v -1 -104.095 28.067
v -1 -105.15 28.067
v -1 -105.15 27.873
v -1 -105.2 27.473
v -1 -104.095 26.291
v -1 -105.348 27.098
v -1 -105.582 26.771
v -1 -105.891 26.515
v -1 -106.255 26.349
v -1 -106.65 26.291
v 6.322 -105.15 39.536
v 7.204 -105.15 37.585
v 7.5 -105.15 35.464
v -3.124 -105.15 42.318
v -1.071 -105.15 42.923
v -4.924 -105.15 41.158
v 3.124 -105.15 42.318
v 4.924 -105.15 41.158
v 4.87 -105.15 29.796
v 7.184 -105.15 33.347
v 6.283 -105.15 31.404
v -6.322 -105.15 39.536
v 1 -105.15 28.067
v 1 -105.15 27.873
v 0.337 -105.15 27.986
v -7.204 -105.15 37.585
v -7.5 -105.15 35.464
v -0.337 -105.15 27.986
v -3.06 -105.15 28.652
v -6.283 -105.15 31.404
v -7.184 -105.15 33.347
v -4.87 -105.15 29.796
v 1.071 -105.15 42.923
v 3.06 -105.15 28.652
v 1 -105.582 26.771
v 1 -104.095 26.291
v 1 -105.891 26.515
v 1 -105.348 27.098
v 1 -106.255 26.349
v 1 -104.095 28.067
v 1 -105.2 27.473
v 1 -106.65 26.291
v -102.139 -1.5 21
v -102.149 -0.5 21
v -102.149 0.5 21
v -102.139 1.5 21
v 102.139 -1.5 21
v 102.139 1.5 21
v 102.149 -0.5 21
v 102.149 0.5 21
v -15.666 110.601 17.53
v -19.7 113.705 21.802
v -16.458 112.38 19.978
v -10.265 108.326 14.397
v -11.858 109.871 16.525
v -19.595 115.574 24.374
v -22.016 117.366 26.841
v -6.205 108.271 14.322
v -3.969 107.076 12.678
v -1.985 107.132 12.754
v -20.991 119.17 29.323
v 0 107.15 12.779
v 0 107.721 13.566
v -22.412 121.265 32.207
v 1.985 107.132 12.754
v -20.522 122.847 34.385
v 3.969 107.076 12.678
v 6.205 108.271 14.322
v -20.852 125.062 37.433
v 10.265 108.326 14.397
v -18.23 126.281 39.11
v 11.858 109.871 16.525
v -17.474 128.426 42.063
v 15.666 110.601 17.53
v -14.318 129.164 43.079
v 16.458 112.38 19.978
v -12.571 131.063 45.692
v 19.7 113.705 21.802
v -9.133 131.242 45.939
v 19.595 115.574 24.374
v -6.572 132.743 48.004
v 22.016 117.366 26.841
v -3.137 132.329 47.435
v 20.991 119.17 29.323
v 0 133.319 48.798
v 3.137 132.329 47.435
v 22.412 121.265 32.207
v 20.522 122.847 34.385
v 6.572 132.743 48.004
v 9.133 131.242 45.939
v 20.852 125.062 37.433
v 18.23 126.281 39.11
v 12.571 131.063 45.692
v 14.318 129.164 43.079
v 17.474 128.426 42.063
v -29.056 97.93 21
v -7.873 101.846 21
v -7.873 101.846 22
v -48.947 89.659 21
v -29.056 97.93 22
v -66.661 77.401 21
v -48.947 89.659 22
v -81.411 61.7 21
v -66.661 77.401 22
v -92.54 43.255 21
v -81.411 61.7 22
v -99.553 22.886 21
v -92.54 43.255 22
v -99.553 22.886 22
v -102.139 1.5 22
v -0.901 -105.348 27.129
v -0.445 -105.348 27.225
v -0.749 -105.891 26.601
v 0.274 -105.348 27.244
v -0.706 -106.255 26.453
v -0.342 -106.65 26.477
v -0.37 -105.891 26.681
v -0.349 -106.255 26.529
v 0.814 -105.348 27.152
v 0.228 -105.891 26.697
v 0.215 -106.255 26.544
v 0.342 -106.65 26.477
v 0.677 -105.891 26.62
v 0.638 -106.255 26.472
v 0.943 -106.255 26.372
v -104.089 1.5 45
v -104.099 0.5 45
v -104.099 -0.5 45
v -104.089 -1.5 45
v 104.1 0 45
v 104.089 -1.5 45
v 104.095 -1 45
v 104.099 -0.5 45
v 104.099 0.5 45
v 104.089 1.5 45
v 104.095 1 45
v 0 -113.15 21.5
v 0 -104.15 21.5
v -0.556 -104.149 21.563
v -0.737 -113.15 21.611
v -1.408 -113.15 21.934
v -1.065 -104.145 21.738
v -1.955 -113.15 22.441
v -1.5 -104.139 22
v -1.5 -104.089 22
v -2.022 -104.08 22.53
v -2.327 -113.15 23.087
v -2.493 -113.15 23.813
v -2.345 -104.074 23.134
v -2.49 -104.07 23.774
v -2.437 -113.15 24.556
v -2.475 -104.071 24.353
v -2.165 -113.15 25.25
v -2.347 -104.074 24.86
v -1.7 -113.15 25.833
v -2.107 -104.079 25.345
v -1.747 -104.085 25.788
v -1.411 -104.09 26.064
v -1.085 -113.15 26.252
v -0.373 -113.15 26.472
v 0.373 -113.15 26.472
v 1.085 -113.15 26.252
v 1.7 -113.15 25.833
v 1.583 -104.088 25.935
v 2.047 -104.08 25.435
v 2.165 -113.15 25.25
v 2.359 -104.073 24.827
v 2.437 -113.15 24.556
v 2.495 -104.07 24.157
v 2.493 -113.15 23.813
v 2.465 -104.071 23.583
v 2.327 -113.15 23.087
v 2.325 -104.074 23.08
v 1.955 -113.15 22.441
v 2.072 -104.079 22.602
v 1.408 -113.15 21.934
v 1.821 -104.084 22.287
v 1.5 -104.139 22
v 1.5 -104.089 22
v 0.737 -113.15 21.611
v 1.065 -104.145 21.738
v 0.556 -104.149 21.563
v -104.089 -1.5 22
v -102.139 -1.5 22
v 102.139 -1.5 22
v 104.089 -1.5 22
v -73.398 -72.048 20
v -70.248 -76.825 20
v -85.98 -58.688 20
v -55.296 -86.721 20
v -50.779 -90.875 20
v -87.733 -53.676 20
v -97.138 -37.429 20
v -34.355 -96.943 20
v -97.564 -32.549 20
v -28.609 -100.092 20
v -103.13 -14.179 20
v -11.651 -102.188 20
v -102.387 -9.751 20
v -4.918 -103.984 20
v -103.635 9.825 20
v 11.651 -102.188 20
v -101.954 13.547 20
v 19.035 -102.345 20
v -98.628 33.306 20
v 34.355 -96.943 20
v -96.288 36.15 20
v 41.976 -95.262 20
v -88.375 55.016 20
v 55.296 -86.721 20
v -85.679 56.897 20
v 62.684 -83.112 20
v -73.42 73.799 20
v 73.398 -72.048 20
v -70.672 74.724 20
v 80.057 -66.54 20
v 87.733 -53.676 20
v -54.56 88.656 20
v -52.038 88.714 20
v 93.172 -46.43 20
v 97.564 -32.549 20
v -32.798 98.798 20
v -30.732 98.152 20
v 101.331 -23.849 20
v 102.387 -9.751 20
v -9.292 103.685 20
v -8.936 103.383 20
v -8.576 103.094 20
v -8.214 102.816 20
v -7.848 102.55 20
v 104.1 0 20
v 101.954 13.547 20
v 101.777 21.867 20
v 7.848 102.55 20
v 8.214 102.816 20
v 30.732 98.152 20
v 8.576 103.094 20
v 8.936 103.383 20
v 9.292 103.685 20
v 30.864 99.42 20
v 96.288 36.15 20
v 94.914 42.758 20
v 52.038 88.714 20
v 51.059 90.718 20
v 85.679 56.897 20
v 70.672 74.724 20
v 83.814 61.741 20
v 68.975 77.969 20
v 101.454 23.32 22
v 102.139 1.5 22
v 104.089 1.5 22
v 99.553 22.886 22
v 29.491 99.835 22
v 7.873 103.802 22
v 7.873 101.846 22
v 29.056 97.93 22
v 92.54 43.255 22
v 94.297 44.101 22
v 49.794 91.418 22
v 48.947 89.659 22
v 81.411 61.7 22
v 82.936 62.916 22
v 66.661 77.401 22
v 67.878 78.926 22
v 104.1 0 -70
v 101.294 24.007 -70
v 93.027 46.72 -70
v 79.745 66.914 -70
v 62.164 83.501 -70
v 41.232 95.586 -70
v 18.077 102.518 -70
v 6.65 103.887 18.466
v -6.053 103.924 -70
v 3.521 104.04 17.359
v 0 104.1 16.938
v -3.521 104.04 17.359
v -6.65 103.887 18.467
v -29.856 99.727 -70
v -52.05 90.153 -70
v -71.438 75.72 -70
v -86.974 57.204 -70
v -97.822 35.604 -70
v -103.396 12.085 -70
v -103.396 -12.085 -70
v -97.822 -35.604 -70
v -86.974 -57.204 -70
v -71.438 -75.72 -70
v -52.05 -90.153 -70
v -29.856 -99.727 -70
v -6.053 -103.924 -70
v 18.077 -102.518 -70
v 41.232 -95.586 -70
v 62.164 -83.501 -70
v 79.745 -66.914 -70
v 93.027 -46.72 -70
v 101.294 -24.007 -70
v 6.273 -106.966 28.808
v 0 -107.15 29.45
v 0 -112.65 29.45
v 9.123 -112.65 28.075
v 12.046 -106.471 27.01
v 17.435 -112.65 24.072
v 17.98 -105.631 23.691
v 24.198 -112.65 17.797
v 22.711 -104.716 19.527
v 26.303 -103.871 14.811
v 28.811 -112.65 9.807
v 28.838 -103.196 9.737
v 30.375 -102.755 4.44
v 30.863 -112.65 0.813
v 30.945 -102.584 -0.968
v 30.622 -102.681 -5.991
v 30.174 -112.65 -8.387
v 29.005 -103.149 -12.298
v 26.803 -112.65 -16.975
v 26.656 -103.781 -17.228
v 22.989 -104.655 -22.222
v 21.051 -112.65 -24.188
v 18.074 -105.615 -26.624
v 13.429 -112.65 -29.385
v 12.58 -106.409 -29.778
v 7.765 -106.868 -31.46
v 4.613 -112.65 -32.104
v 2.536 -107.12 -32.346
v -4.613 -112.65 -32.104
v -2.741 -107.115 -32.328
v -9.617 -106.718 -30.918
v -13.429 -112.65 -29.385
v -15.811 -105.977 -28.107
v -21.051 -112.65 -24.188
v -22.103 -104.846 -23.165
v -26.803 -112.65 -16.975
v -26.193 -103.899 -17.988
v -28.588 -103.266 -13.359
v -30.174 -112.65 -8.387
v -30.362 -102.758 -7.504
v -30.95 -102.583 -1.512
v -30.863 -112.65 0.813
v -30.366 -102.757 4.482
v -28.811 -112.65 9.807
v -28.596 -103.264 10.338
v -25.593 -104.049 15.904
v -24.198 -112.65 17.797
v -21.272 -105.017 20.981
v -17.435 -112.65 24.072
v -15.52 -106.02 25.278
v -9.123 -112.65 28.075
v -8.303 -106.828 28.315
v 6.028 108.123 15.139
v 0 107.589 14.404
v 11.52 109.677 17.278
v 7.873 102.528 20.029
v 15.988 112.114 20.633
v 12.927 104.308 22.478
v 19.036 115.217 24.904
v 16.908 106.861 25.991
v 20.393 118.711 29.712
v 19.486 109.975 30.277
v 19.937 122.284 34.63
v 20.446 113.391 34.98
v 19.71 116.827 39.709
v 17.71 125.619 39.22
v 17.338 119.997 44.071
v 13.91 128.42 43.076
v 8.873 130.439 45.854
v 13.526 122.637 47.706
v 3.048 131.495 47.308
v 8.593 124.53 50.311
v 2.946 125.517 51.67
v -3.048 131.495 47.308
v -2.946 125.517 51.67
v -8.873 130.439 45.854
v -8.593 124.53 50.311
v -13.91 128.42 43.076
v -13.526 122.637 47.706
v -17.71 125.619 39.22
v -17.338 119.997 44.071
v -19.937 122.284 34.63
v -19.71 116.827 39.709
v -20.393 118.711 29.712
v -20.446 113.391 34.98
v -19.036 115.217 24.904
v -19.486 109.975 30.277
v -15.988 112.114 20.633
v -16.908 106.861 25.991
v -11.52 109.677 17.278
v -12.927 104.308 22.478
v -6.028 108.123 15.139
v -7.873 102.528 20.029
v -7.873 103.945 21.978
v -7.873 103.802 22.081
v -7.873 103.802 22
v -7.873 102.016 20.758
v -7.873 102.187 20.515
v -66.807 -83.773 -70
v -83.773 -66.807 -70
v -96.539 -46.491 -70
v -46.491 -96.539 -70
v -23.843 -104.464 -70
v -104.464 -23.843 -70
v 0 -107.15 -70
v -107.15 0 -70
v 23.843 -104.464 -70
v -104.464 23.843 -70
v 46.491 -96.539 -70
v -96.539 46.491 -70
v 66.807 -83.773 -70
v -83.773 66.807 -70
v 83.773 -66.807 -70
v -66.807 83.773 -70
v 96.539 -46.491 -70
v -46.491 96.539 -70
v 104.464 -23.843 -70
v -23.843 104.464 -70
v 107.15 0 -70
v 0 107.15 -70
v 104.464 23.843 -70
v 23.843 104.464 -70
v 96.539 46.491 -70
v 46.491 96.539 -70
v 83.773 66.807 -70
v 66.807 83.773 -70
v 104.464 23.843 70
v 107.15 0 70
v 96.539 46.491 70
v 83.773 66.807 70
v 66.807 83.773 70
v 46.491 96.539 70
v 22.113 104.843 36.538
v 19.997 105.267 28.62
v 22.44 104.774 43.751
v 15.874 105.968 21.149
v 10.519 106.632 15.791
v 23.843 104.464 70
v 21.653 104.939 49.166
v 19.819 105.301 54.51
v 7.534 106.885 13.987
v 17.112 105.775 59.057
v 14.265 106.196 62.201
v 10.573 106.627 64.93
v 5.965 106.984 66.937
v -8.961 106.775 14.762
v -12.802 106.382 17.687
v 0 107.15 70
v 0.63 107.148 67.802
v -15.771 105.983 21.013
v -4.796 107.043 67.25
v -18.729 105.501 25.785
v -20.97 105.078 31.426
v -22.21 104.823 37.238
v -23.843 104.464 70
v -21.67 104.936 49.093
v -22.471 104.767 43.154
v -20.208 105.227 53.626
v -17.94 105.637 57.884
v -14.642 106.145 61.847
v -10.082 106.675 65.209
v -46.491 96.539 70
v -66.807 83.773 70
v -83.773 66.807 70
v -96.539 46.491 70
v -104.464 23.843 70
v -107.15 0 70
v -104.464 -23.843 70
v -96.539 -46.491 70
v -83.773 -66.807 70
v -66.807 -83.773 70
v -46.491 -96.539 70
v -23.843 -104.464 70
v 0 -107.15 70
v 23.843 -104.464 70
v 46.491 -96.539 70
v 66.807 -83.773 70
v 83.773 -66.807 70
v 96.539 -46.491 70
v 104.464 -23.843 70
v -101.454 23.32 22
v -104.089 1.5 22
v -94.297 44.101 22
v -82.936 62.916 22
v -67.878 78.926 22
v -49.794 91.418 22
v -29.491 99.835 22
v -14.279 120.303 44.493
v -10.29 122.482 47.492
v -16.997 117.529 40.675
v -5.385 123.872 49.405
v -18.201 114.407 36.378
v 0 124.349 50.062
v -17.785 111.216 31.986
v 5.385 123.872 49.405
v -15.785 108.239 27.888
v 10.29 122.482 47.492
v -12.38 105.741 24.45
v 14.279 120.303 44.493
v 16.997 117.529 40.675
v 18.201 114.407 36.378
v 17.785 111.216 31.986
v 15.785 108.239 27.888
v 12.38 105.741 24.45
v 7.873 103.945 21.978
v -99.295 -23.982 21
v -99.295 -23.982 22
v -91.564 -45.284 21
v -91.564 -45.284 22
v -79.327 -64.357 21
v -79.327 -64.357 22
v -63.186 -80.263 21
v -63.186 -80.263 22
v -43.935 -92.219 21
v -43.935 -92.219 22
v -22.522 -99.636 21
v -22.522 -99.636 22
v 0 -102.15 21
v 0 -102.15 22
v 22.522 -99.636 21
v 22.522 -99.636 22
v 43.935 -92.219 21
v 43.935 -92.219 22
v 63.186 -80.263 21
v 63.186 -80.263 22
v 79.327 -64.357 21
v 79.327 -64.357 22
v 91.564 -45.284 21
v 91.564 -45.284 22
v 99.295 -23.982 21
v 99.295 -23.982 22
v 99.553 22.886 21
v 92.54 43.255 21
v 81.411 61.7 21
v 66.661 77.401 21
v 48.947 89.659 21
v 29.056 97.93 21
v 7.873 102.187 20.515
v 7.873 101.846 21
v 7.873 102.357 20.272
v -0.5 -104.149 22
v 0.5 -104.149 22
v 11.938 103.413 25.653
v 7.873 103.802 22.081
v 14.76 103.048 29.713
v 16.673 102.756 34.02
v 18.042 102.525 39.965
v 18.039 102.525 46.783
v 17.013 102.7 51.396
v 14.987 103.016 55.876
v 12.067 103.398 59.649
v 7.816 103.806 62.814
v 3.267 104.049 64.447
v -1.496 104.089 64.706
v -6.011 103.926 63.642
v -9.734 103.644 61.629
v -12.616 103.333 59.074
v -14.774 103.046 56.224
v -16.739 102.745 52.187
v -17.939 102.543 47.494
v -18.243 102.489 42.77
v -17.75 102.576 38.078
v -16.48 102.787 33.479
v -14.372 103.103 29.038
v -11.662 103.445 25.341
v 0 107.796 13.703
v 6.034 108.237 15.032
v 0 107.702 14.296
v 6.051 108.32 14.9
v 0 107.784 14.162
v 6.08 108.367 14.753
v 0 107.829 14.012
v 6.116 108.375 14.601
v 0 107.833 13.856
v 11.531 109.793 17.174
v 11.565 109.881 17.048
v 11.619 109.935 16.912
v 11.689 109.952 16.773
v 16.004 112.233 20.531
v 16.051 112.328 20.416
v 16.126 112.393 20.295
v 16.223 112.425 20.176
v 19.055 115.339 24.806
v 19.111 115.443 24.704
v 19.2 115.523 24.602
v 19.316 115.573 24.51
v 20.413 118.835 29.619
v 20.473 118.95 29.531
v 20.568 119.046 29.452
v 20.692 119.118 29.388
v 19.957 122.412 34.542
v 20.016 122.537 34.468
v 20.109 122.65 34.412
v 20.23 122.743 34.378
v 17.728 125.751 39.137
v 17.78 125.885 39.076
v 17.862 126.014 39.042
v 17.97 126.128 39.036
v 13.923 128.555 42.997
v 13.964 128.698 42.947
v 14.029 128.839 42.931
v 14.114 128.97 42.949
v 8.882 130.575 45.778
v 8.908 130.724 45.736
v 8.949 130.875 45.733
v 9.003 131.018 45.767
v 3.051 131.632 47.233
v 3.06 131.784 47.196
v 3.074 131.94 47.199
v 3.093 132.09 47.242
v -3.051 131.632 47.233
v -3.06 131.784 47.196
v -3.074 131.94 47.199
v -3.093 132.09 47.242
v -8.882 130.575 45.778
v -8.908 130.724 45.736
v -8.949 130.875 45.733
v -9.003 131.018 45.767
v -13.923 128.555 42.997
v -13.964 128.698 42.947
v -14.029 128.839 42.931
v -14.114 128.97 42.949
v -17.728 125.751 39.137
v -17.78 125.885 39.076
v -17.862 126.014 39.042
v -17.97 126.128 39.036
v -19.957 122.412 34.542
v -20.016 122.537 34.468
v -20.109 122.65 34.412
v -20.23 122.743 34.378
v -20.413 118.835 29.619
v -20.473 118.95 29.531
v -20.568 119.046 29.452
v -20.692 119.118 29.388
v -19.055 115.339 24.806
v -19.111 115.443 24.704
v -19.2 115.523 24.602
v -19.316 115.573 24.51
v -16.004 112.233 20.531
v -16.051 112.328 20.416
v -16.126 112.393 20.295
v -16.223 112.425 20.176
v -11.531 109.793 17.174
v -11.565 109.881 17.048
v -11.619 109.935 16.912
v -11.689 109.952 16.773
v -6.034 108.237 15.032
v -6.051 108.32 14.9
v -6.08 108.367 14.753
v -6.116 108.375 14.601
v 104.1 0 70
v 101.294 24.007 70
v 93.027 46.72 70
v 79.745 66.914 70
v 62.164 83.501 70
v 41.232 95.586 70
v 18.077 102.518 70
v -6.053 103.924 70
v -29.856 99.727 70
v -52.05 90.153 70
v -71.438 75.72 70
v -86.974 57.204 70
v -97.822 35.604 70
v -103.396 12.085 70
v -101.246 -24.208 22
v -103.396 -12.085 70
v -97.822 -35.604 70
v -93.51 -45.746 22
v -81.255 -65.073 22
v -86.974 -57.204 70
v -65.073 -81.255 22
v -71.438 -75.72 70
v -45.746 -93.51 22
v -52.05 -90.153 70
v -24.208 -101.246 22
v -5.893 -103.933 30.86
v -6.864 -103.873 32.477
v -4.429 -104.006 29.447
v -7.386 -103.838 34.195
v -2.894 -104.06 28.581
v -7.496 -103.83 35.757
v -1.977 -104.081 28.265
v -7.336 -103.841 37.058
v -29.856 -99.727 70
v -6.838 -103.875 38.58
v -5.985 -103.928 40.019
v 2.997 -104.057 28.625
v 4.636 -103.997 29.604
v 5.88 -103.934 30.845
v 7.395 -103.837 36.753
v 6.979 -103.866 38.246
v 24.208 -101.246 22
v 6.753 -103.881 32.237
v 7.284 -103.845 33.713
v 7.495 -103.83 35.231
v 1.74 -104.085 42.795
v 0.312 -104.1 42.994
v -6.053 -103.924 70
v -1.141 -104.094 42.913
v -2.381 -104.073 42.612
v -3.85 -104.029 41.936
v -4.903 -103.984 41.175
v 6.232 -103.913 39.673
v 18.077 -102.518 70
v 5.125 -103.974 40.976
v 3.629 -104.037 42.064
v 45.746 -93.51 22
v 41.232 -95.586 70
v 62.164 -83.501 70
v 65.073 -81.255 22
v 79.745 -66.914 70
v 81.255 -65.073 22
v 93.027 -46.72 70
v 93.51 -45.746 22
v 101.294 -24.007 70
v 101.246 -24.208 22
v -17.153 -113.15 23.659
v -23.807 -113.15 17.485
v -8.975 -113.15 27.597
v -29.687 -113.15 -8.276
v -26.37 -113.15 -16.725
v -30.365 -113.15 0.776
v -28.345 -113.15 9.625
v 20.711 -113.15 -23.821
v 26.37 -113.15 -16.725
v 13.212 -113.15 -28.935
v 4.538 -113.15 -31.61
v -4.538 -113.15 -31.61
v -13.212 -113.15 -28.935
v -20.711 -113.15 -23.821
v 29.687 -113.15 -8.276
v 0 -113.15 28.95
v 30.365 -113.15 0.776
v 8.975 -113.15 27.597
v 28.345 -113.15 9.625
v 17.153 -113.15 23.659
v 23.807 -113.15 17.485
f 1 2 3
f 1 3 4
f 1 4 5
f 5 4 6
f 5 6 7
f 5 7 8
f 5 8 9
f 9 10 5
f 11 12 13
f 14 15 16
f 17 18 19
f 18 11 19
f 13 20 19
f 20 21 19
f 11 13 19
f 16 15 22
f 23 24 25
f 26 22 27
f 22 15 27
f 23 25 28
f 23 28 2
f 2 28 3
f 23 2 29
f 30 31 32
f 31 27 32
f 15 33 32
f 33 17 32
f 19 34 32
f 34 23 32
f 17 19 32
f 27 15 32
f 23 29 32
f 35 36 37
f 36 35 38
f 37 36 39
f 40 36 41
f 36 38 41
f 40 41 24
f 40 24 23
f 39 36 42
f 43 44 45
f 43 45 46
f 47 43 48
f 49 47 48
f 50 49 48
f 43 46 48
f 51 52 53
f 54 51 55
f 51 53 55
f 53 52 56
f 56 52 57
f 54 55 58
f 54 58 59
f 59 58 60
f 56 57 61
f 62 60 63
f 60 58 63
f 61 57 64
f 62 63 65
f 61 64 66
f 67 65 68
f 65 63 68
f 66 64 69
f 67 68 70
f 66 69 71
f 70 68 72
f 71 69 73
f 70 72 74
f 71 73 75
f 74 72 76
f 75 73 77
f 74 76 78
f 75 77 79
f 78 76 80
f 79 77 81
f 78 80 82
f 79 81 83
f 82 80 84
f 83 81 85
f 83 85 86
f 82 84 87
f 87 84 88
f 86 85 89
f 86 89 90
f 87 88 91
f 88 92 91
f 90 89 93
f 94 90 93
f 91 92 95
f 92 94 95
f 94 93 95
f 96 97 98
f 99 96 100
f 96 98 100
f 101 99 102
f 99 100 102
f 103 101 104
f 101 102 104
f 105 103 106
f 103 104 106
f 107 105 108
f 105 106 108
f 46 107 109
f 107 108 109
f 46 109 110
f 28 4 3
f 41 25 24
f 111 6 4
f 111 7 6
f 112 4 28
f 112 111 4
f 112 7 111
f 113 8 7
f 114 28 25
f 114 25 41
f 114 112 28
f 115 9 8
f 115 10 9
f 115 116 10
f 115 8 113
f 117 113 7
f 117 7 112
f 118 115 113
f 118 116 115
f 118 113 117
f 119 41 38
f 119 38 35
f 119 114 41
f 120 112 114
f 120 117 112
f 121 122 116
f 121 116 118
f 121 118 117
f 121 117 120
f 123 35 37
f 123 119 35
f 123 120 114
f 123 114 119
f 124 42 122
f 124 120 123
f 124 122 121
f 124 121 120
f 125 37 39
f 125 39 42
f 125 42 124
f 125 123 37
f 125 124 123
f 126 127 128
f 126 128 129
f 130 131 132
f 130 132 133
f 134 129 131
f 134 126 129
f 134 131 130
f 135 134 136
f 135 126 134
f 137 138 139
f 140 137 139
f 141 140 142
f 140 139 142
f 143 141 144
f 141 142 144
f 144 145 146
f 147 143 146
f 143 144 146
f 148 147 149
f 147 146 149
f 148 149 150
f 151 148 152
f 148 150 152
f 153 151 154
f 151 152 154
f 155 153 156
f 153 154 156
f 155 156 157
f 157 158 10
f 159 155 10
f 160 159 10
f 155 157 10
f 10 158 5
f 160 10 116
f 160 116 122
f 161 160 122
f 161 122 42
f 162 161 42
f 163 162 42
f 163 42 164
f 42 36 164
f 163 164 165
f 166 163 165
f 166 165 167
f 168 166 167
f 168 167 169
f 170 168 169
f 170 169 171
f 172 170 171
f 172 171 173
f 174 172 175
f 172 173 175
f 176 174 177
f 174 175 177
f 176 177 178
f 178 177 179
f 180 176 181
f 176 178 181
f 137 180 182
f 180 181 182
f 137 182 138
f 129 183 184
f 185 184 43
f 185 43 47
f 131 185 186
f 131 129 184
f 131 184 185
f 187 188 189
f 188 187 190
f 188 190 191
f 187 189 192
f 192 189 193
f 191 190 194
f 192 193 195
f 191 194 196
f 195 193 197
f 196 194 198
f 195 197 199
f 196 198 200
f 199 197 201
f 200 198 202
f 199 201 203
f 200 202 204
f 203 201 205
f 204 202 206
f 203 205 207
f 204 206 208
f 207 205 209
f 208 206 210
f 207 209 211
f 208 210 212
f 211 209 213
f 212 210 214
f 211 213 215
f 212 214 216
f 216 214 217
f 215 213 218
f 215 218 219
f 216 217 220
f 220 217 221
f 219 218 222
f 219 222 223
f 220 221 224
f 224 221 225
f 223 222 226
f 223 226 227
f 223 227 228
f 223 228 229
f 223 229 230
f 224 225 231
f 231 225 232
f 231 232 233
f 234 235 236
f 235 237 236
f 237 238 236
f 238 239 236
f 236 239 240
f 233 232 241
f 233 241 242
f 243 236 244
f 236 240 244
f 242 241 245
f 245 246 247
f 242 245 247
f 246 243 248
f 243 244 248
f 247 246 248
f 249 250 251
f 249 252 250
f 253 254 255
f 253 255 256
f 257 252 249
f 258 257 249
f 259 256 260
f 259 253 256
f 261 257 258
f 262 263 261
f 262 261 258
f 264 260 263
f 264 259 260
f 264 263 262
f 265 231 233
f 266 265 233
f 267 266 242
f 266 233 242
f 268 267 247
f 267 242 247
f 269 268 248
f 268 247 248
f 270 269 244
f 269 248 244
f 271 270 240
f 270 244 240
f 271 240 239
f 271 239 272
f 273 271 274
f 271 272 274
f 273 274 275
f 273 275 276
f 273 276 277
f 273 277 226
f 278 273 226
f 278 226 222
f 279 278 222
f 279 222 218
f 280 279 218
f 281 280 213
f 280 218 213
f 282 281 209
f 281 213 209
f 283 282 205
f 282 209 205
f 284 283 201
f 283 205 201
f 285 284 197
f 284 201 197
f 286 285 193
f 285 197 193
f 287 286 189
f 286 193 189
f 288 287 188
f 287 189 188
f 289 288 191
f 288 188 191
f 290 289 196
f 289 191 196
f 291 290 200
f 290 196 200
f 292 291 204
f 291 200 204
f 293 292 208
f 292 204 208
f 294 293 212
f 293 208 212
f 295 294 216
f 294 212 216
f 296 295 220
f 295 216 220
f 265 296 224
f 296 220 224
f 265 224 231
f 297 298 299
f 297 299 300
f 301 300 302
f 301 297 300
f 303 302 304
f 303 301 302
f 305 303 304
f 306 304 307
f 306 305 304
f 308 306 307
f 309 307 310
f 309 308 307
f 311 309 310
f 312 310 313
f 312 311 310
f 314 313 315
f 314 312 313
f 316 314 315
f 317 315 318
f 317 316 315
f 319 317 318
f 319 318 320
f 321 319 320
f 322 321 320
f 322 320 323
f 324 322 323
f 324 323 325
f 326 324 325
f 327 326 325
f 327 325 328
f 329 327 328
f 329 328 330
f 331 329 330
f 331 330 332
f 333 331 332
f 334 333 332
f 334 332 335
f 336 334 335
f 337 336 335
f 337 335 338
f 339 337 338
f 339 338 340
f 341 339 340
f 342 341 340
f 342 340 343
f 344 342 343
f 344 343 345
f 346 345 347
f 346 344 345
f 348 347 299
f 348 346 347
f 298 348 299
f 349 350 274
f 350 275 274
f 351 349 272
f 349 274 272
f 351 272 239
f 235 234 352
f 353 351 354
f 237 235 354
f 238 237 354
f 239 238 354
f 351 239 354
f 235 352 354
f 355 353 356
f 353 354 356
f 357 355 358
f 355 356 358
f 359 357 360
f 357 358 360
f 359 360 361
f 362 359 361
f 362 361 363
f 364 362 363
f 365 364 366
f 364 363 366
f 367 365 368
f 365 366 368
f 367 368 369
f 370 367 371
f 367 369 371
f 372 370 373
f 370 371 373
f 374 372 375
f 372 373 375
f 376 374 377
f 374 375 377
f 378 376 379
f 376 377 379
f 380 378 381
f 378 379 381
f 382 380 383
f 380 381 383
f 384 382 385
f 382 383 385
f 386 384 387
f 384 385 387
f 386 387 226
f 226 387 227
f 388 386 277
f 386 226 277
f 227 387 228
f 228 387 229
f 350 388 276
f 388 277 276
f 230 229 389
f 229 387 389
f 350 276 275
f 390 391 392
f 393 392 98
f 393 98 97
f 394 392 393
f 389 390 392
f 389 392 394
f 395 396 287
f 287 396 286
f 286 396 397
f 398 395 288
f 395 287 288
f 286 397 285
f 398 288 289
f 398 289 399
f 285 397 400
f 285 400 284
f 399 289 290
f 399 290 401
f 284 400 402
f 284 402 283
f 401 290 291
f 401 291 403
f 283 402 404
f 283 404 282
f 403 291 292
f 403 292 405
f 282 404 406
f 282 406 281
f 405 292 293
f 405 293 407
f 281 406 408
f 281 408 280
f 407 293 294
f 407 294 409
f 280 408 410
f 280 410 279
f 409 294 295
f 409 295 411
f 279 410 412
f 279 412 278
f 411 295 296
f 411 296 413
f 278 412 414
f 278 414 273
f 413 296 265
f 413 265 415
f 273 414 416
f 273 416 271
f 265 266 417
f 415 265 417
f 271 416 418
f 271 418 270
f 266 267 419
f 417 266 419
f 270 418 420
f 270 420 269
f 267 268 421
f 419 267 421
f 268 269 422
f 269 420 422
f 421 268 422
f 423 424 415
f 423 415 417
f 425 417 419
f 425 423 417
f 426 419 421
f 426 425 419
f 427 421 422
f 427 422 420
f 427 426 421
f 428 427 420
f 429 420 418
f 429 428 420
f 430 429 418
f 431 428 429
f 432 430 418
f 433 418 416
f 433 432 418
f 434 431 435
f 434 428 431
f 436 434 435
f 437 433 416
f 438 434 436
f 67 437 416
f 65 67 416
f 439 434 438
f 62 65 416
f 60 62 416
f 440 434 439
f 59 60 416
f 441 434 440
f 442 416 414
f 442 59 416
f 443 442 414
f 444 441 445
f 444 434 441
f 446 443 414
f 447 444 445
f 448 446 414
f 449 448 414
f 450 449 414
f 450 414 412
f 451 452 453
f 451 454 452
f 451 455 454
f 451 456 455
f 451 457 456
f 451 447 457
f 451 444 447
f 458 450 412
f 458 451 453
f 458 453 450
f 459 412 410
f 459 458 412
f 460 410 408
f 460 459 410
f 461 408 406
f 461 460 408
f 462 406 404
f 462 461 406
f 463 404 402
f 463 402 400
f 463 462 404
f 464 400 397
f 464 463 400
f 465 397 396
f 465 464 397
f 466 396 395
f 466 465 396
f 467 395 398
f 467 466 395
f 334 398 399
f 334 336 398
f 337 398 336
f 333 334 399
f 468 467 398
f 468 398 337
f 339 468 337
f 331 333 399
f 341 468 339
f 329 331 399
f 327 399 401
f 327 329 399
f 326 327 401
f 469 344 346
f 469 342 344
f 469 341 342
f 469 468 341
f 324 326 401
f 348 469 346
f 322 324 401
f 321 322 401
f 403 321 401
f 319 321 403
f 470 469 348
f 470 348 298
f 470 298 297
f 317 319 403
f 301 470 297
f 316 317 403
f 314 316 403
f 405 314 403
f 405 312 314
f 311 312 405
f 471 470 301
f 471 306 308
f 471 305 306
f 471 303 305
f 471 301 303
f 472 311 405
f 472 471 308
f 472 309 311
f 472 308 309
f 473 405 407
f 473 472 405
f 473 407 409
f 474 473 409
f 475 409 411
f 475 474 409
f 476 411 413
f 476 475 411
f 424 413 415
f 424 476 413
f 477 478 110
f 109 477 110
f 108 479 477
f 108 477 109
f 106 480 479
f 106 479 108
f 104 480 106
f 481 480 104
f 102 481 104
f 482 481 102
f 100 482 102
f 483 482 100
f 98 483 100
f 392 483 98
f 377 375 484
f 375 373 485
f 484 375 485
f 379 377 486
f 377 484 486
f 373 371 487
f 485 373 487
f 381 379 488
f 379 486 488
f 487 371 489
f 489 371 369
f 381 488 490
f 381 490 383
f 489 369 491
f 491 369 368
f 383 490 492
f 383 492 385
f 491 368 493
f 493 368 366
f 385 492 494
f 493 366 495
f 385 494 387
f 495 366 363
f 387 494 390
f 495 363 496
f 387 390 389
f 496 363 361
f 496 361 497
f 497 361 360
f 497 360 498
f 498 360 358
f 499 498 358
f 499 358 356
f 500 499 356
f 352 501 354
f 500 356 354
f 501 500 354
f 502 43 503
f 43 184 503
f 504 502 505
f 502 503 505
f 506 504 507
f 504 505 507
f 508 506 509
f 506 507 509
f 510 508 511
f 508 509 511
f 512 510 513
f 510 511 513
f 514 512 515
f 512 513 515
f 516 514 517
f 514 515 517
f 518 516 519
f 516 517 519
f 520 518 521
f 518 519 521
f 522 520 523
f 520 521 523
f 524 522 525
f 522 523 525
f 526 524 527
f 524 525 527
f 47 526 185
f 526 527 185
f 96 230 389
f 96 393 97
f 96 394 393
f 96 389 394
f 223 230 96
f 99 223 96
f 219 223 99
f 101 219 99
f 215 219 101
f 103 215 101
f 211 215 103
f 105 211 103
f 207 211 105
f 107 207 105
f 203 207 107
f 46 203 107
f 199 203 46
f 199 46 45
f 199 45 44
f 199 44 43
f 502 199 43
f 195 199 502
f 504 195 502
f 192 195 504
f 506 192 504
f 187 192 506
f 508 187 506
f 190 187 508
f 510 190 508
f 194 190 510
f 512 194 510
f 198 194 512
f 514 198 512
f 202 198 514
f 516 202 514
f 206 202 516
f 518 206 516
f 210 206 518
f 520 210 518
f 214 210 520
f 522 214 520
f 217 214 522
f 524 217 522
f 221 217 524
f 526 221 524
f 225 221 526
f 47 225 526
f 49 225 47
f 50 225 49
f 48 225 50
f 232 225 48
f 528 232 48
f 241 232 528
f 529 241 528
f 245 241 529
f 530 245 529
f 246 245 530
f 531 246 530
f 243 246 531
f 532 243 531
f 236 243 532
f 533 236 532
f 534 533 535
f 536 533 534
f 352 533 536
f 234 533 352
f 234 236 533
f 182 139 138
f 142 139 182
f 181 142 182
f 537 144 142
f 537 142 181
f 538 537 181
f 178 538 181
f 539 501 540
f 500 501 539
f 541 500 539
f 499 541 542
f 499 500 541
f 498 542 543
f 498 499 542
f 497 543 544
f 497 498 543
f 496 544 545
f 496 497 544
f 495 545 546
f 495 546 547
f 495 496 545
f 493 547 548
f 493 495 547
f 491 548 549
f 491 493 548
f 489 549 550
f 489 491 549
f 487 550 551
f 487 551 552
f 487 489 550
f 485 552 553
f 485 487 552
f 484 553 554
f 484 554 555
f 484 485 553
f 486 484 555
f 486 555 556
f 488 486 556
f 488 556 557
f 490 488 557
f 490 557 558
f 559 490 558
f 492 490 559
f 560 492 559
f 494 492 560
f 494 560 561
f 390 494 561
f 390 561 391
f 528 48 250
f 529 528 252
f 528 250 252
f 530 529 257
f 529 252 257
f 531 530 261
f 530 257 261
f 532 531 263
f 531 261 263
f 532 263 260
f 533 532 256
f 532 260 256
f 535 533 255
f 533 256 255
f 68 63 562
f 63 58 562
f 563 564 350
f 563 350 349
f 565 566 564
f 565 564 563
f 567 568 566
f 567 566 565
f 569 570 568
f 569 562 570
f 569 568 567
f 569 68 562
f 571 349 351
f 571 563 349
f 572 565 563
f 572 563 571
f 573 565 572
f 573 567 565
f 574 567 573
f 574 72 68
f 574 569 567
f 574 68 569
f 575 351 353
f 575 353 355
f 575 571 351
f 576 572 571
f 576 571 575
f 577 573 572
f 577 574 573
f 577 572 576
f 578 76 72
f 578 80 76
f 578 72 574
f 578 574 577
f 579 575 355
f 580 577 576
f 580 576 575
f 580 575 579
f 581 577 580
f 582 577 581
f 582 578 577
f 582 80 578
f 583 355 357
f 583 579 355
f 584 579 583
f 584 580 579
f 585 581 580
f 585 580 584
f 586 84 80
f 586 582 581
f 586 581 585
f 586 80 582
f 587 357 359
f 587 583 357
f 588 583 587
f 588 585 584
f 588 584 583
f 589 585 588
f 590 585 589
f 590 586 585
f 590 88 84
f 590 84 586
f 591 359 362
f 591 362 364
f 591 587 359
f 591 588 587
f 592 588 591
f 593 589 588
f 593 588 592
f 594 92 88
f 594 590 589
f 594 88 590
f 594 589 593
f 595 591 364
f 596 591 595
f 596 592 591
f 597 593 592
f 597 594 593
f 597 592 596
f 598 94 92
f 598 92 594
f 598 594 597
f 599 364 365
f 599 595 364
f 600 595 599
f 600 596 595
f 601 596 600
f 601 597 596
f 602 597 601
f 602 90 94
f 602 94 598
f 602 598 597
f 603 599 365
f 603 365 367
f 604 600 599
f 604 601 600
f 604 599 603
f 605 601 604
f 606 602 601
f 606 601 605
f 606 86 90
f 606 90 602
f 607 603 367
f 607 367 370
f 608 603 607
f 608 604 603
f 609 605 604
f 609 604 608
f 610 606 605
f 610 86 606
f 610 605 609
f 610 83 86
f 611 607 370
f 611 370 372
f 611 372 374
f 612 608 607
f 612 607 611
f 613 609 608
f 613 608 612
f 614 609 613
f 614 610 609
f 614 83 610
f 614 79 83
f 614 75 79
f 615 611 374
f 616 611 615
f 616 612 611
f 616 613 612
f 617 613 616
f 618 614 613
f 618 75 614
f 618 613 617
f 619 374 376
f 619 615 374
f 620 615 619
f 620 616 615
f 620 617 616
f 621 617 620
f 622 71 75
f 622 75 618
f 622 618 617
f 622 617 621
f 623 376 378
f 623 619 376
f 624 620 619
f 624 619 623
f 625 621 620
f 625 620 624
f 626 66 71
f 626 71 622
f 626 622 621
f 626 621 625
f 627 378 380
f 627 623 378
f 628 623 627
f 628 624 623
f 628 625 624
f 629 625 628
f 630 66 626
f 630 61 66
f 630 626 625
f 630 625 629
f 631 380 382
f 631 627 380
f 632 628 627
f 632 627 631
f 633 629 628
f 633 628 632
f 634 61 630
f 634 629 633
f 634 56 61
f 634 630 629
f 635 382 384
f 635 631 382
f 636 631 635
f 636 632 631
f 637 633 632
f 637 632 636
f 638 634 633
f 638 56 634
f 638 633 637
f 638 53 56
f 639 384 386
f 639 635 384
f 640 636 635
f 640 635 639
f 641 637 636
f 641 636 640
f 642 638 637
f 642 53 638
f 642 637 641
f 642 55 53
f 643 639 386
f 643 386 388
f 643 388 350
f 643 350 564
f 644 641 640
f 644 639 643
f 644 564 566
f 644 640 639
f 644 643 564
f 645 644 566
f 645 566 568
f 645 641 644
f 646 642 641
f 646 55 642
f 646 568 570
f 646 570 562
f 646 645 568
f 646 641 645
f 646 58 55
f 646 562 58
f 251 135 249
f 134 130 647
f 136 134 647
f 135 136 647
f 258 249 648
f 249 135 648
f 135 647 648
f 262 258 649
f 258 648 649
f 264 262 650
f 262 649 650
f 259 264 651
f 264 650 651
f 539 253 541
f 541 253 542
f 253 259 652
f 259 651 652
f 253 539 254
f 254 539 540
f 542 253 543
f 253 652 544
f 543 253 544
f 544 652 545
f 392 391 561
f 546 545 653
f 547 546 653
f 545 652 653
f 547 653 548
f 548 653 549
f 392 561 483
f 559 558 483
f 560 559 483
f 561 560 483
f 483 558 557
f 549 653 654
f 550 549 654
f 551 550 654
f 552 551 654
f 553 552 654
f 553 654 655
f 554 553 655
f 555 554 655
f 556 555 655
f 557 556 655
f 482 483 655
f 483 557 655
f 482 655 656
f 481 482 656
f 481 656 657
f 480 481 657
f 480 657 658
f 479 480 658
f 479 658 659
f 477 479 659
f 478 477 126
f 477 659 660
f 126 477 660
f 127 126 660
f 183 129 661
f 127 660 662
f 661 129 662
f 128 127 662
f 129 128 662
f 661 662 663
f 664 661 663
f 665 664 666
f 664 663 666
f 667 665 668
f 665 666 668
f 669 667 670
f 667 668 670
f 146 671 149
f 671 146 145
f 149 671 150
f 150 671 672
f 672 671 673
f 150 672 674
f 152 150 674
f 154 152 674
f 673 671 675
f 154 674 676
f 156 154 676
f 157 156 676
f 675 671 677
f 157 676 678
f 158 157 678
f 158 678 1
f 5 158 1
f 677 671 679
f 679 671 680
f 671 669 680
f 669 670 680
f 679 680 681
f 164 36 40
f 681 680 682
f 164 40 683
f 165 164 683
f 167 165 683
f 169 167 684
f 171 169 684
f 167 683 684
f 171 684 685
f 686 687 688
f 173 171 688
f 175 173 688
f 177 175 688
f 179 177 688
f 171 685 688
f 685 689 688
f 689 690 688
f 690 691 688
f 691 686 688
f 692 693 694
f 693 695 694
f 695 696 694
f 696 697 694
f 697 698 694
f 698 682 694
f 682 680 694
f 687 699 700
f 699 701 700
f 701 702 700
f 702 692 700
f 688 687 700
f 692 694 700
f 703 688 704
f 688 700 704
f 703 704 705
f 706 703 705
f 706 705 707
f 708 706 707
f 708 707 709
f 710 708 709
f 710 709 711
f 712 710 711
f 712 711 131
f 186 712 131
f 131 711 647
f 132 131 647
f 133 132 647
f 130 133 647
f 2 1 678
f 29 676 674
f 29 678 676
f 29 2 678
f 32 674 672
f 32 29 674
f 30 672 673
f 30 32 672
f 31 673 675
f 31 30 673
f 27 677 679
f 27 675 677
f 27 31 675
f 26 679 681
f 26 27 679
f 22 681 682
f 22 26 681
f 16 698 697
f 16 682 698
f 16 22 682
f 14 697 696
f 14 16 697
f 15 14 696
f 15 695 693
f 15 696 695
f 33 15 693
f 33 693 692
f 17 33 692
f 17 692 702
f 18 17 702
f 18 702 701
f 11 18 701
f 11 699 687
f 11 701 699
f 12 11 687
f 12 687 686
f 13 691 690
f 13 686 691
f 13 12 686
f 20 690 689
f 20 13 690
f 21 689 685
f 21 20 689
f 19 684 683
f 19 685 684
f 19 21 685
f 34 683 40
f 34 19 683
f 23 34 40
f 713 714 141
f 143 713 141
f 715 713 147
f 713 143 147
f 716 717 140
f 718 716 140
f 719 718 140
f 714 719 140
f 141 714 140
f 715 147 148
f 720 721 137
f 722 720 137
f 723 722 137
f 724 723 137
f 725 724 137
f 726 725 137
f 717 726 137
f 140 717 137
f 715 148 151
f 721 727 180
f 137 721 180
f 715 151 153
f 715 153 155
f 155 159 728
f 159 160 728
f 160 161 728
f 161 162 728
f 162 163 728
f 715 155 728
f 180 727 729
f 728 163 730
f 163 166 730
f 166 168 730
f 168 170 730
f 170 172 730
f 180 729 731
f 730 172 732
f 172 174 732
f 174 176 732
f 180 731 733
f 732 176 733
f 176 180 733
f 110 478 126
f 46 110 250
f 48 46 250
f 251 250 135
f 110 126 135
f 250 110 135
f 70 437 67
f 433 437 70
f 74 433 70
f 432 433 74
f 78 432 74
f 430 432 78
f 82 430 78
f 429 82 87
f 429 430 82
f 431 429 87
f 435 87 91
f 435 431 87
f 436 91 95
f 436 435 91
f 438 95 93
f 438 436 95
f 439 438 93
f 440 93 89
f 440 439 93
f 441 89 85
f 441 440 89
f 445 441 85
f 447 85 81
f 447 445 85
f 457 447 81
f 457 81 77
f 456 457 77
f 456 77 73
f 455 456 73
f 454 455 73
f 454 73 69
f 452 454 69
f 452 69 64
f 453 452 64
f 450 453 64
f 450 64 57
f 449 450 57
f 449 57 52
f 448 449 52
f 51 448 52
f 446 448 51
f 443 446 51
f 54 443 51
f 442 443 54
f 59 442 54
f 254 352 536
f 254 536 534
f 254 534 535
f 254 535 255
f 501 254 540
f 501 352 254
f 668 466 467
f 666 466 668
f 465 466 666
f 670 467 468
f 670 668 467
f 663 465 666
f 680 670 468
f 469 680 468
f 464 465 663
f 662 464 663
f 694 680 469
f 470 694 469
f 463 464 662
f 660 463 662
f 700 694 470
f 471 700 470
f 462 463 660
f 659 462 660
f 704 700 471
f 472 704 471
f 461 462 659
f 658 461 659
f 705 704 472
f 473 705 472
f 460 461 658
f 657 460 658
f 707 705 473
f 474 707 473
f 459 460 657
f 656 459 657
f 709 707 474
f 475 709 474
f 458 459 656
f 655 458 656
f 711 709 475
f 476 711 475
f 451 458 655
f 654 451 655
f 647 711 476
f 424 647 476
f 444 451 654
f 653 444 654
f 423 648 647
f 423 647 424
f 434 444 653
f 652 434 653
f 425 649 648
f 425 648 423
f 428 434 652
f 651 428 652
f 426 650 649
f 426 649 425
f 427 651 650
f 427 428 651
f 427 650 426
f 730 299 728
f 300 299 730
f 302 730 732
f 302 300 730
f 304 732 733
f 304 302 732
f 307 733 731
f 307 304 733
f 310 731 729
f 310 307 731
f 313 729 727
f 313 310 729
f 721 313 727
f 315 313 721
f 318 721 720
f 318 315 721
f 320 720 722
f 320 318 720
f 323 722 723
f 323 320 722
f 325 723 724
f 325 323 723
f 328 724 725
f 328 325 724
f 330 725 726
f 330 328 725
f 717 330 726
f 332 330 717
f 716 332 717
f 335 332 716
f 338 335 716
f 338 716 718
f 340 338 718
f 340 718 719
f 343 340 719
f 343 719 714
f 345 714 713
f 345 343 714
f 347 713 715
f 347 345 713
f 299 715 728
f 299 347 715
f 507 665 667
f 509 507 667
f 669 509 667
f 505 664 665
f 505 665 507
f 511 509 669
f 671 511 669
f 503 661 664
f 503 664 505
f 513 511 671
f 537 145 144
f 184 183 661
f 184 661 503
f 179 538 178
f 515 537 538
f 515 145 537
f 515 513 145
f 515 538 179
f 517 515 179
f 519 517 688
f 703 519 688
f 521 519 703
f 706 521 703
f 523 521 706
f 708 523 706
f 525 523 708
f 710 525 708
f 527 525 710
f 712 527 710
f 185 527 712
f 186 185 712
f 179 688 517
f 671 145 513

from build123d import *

# Parameters (mm, degrees)
BOSS_EXTRUDE2_DEPTH      = 70
BOSS_EXTRUDE2_DEPTH_BACK = 70
SKETCH2_R                = 107.15
SKETCH10_R               = 19
CUT_EXTRUDE2_DEPTH       = 10
BOSS_EXTRUDE6_DEPTH      = 32
BOSS_EXTRUDE6_DEPTH_BACK = 1
SKETCH18_R               = 22.5
BOSS_EXTRUDE7_DEPTH      = 5
BOSS_EXTRUDE7_DEPTH_BACK = 6
SKETCH56_R               = 30.95
SKETCH20_R               = 104.1
CUT_EXTRUDE3_DEPTH       = 140
CUT_EXTRUDE14_DEPTH      = 5
CUT_EXTRUDE14_DEPTH_BACK = 55
SKETCH51_R               = 2.5
CUT_EXTRUDE15_DEPTH      = 5
SKETCH44_R               = 7.5
CUT_EXTRUDE10_DEPTH      = 10
FILLET3_R                = 1.5
SKETCH61_R               = 104.15
BOSS_EXTRUDE8_DEPTH      = 2
SKETCH62_R               = 102.15
CUT_EXTRUDE16_DEPTH      = 10
CHAMFER7_SIZE            = 1
CHAMFER7_SIZE2           = 0.700207538
SKETCH5_W                = 211.3
SKETCH5_H                = 3
BOSS_EXTRUDE3_DEPTH      = 24
SKETCH24_R               = 18.25
CUT_EXTRUDE6_DEPTH       = 50
CUT_EXTRUDE5_DEPTH       = 7
CUT_EXTRUDE5_DEPTH_BACK  = 5
SKETCH23_R               = 20.45
CHAMFER1_SIZE            = 0.5
FILLET4_R                = 0.6
CUT_EXTRUDE19_DEPTH      = 4


with BuildPart() as part:
    # Sketch2 → Boss-Extrude2 (new, two sides: drawn at the far end of the back side and taken through both)
    with BuildSketch(Plane.XY.offset(-BOSS_EXTRUDE2_DEPTH_BACK)):
        Circle(SKETCH2_R)
    extrude(amount=BOSS_EXTRUDE2_DEPTH + BOSS_EXTRUDE2_DEPTH_BACK)

    # Sketch10 → Cut-Extrude2 (cut, symmetric)
    with BuildSketch(Plane(origin=(0, 51.109455148, -37.133192748), x_dir=(1, 0, 0), z_dir=(0, -0.8090169943749408, 0.5877852522924822))):
        with Locations((0, 95.341869558)):
            Circle(SKETCH10_R)
    extrude(amount=CUT_EXTRUDE2_DEPTH, both=True, mode=Mode.SUBTRACT)

    # Sketch18 → Boss-Extrude6 (add, two sides: drawn at the far end of the back side and taken through both)
    with BuildSketch(Plane(origin=(0, 63.244710063, -45.949971532), x_dir=(1, 0, 0), z_dir=(0, -0.8090169943749408, 0.5877852522924822)).offset(-BOSS_EXTRUDE6_DEPTH_BACK)):
        with Locations((0, 95.341869558)):
            Circle(SKETCH18_R)
    extrude(amount=BOSS_EXTRUDE6_DEPTH + BOSS_EXTRUDE6_DEPTH_BACK)

    # Sketch56 → Boss-Extrude7 (add, two sides: drawn at the far end of the back side and taken through both)
    with BuildSketch(Plane(origin=(0, -107.15, 0), x_dir=(1, 0, 0), z_dir=(0, 1, 0)).offset(-BOSS_EXTRUDE7_DEPTH_BACK)):
        with Locations((0, 1.5)):
            Circle(SKETCH56_R)
    extrude(amount=BOSS_EXTRUDE7_DEPTH + BOSS_EXTRUDE7_DEPTH_BACK)

    # Sketch20 → Cut-Extrude3 (cut)
    with BuildSketch(Plane.XY.offset(70)):
        Circle(SKETCH20_R)
    extrude(amount=-CUT_EXTRUDE3_DEPTH, mode=Mode.SUBTRACT)

    # Sketch51 → Cut-Extrude14 (cut, two sides: drawn at the far end of the back side and taken through both)
    with BuildSketch(Plane(origin=(0, -107.15, 0), x_dir=(1, 0, 0), z_dir=(0, 1, 0)).offset(-CUT_EXTRUDE14_DEPTH_BACK)):
        with Locations((0, -24)):
            Circle(SKETCH51_R)
    extrude(amount=CUT_EXTRUDE14_DEPTH + CUT_EXTRUDE14_DEPTH_BACK, mode=Mode.SUBTRACT)

    # Sketch58 → Cut-Extrude15 (cut)
    with BuildSketch(Plane(origin=(0, -105.15, 0), x_dir=(1, 0, 0), z_dir=(0, 1, 0))):
        Polygon((0, -24), (1, -24), (1, -34.192827208), (-1, -34.192827208), (-1, -24), align=None)
    extrude(amount=CUT_EXTRUDE15_DEPTH, mode=Mode.SUBTRACT)

    # Sketch44 → Cut-Extrude10 (cut)
    with BuildSketch(Plane(origin=(0, -105.15, 0), x_dir=(1, 0, 0), z_dir=(0, 1, 0))):
        with Locations((0, -35.5)):
            Circle(SKETCH44_R)
    extrude(amount=CUT_EXTRUDE10_DEPTH, mode=Mode.SUBTRACT)

    # Fillet3
    fillet3_edges = [part.edges().sort_by_distance(p)[0] for p in [
        (0, -105.15, 26.5),
    ]]
    fillet(fillet3_edges, radius=FILLET3_R)

    # Sketch61 → Boss-Extrude8 (add)
    with BuildSketch(Plane.XY.offset(22)):
        Circle(SKETCH61_R)
    extrude(amount=-BOSS_EXTRUDE8_DEPTH)

    # Sketch62 → Cut-Extrude16 (cut)
    with BuildSketch(Plane.XY.offset(22)):
        Circle(SKETCH62_R)
    extrude(amount=-CUT_EXTRUDE16_DEPTH, mode=Mode.SUBTRACT)

    # Chamfer7
    chamfer7_edges = [part.edges().sort_by_distance(p)[0] for p in [
        (-102.15, 0, 20),
    ]]
    chamfer7_side = [part.faces().sort_by_distance(p)[0] for p in [
        (-102.15, 0, 21),
    ]]
    chamfer(chamfer7_edges, length=CHAMFER7_SIZE, length2=CHAMFER7_SIZE2, reference=chamfer7_side[0])

    # Sketch5 → Boss-Extrude3 (add)
    with BuildSketch(Plane.XY.offset(45)):
        Rectangle(SKETCH5_W, SKETCH5_H)
    extrude(amount=-BOSS_EXTRUDE3_DEPTH)

    # Sketch24 → Cut-Extrude6 (cut)
    with BuildSketch(Plane(origin=(0, 63.244710063, -45.949971532), x_dir=(1, 0, 0), z_dir=(0, -0.8090169943749408, 0.5877852522924822))):
        with Locations((0, 95.341869558)):
            Circle(SKETCH24_R)
    extrude(amount=CUT_EXTRUDE6_DEPTH, mode=Mode.SUBTRACT)

    # Sketch23 → Cut-Extrude5 (cut, two sides: drawn at the far end of the back side and taken through both)
    with BuildSketch(Plane(origin=(0, 63.244710063, -45.949971532), x_dir=(1, 0, 0), z_dir=(0, -0.8090169943749408, 0.5877852522924822)).offset(-CUT_EXTRUDE5_DEPTH_BACK)):
        with Locations((0, 95.341869558)):
            Circle(SKETCH23_R)
    extrude(amount=CUT_EXTRUDE5_DEPTH + CUT_EXTRUDE5_DEPTH_BACK, mode=Mode.SUBTRACT)

    # Chamfer1
    chamfer1_edges = [part.edges().sort_by_distance(p)[0] for p in [
        (-30.95, -113.15, -1.5),
    ]]
    chamfer(chamfer1_edges, length=CHAMFER1_SIZE)

    # Fillet4
    fillet4_edges = [part.edges().sort_by_distance(p)[0] for p in [
        (-20.45, 120.09427191, 30.595435963),
    ]]
    fillet(fillet4_edges, radius=FILLET4_R)

    # Sketch67 → Cut-Extrude19 (cut)
    with BuildSketch(Plane(origin=(0, 57.581591103, -41.835474766), x_dir=(1, 0, 0), z_dir=(0, 0.8090169943749409, -0.5877852522924822))):
        Polygon((-7.872943576, -76.468097824), (7.872943576, -76.468097824), (7.872943576, -79.749667474), (-7.872943576, -79.48866005), align=None)
    extrude(amount=-CUT_EXTRUDE19_DEPTH, mode=Mode.SUBTRACT)


solid = part.part
